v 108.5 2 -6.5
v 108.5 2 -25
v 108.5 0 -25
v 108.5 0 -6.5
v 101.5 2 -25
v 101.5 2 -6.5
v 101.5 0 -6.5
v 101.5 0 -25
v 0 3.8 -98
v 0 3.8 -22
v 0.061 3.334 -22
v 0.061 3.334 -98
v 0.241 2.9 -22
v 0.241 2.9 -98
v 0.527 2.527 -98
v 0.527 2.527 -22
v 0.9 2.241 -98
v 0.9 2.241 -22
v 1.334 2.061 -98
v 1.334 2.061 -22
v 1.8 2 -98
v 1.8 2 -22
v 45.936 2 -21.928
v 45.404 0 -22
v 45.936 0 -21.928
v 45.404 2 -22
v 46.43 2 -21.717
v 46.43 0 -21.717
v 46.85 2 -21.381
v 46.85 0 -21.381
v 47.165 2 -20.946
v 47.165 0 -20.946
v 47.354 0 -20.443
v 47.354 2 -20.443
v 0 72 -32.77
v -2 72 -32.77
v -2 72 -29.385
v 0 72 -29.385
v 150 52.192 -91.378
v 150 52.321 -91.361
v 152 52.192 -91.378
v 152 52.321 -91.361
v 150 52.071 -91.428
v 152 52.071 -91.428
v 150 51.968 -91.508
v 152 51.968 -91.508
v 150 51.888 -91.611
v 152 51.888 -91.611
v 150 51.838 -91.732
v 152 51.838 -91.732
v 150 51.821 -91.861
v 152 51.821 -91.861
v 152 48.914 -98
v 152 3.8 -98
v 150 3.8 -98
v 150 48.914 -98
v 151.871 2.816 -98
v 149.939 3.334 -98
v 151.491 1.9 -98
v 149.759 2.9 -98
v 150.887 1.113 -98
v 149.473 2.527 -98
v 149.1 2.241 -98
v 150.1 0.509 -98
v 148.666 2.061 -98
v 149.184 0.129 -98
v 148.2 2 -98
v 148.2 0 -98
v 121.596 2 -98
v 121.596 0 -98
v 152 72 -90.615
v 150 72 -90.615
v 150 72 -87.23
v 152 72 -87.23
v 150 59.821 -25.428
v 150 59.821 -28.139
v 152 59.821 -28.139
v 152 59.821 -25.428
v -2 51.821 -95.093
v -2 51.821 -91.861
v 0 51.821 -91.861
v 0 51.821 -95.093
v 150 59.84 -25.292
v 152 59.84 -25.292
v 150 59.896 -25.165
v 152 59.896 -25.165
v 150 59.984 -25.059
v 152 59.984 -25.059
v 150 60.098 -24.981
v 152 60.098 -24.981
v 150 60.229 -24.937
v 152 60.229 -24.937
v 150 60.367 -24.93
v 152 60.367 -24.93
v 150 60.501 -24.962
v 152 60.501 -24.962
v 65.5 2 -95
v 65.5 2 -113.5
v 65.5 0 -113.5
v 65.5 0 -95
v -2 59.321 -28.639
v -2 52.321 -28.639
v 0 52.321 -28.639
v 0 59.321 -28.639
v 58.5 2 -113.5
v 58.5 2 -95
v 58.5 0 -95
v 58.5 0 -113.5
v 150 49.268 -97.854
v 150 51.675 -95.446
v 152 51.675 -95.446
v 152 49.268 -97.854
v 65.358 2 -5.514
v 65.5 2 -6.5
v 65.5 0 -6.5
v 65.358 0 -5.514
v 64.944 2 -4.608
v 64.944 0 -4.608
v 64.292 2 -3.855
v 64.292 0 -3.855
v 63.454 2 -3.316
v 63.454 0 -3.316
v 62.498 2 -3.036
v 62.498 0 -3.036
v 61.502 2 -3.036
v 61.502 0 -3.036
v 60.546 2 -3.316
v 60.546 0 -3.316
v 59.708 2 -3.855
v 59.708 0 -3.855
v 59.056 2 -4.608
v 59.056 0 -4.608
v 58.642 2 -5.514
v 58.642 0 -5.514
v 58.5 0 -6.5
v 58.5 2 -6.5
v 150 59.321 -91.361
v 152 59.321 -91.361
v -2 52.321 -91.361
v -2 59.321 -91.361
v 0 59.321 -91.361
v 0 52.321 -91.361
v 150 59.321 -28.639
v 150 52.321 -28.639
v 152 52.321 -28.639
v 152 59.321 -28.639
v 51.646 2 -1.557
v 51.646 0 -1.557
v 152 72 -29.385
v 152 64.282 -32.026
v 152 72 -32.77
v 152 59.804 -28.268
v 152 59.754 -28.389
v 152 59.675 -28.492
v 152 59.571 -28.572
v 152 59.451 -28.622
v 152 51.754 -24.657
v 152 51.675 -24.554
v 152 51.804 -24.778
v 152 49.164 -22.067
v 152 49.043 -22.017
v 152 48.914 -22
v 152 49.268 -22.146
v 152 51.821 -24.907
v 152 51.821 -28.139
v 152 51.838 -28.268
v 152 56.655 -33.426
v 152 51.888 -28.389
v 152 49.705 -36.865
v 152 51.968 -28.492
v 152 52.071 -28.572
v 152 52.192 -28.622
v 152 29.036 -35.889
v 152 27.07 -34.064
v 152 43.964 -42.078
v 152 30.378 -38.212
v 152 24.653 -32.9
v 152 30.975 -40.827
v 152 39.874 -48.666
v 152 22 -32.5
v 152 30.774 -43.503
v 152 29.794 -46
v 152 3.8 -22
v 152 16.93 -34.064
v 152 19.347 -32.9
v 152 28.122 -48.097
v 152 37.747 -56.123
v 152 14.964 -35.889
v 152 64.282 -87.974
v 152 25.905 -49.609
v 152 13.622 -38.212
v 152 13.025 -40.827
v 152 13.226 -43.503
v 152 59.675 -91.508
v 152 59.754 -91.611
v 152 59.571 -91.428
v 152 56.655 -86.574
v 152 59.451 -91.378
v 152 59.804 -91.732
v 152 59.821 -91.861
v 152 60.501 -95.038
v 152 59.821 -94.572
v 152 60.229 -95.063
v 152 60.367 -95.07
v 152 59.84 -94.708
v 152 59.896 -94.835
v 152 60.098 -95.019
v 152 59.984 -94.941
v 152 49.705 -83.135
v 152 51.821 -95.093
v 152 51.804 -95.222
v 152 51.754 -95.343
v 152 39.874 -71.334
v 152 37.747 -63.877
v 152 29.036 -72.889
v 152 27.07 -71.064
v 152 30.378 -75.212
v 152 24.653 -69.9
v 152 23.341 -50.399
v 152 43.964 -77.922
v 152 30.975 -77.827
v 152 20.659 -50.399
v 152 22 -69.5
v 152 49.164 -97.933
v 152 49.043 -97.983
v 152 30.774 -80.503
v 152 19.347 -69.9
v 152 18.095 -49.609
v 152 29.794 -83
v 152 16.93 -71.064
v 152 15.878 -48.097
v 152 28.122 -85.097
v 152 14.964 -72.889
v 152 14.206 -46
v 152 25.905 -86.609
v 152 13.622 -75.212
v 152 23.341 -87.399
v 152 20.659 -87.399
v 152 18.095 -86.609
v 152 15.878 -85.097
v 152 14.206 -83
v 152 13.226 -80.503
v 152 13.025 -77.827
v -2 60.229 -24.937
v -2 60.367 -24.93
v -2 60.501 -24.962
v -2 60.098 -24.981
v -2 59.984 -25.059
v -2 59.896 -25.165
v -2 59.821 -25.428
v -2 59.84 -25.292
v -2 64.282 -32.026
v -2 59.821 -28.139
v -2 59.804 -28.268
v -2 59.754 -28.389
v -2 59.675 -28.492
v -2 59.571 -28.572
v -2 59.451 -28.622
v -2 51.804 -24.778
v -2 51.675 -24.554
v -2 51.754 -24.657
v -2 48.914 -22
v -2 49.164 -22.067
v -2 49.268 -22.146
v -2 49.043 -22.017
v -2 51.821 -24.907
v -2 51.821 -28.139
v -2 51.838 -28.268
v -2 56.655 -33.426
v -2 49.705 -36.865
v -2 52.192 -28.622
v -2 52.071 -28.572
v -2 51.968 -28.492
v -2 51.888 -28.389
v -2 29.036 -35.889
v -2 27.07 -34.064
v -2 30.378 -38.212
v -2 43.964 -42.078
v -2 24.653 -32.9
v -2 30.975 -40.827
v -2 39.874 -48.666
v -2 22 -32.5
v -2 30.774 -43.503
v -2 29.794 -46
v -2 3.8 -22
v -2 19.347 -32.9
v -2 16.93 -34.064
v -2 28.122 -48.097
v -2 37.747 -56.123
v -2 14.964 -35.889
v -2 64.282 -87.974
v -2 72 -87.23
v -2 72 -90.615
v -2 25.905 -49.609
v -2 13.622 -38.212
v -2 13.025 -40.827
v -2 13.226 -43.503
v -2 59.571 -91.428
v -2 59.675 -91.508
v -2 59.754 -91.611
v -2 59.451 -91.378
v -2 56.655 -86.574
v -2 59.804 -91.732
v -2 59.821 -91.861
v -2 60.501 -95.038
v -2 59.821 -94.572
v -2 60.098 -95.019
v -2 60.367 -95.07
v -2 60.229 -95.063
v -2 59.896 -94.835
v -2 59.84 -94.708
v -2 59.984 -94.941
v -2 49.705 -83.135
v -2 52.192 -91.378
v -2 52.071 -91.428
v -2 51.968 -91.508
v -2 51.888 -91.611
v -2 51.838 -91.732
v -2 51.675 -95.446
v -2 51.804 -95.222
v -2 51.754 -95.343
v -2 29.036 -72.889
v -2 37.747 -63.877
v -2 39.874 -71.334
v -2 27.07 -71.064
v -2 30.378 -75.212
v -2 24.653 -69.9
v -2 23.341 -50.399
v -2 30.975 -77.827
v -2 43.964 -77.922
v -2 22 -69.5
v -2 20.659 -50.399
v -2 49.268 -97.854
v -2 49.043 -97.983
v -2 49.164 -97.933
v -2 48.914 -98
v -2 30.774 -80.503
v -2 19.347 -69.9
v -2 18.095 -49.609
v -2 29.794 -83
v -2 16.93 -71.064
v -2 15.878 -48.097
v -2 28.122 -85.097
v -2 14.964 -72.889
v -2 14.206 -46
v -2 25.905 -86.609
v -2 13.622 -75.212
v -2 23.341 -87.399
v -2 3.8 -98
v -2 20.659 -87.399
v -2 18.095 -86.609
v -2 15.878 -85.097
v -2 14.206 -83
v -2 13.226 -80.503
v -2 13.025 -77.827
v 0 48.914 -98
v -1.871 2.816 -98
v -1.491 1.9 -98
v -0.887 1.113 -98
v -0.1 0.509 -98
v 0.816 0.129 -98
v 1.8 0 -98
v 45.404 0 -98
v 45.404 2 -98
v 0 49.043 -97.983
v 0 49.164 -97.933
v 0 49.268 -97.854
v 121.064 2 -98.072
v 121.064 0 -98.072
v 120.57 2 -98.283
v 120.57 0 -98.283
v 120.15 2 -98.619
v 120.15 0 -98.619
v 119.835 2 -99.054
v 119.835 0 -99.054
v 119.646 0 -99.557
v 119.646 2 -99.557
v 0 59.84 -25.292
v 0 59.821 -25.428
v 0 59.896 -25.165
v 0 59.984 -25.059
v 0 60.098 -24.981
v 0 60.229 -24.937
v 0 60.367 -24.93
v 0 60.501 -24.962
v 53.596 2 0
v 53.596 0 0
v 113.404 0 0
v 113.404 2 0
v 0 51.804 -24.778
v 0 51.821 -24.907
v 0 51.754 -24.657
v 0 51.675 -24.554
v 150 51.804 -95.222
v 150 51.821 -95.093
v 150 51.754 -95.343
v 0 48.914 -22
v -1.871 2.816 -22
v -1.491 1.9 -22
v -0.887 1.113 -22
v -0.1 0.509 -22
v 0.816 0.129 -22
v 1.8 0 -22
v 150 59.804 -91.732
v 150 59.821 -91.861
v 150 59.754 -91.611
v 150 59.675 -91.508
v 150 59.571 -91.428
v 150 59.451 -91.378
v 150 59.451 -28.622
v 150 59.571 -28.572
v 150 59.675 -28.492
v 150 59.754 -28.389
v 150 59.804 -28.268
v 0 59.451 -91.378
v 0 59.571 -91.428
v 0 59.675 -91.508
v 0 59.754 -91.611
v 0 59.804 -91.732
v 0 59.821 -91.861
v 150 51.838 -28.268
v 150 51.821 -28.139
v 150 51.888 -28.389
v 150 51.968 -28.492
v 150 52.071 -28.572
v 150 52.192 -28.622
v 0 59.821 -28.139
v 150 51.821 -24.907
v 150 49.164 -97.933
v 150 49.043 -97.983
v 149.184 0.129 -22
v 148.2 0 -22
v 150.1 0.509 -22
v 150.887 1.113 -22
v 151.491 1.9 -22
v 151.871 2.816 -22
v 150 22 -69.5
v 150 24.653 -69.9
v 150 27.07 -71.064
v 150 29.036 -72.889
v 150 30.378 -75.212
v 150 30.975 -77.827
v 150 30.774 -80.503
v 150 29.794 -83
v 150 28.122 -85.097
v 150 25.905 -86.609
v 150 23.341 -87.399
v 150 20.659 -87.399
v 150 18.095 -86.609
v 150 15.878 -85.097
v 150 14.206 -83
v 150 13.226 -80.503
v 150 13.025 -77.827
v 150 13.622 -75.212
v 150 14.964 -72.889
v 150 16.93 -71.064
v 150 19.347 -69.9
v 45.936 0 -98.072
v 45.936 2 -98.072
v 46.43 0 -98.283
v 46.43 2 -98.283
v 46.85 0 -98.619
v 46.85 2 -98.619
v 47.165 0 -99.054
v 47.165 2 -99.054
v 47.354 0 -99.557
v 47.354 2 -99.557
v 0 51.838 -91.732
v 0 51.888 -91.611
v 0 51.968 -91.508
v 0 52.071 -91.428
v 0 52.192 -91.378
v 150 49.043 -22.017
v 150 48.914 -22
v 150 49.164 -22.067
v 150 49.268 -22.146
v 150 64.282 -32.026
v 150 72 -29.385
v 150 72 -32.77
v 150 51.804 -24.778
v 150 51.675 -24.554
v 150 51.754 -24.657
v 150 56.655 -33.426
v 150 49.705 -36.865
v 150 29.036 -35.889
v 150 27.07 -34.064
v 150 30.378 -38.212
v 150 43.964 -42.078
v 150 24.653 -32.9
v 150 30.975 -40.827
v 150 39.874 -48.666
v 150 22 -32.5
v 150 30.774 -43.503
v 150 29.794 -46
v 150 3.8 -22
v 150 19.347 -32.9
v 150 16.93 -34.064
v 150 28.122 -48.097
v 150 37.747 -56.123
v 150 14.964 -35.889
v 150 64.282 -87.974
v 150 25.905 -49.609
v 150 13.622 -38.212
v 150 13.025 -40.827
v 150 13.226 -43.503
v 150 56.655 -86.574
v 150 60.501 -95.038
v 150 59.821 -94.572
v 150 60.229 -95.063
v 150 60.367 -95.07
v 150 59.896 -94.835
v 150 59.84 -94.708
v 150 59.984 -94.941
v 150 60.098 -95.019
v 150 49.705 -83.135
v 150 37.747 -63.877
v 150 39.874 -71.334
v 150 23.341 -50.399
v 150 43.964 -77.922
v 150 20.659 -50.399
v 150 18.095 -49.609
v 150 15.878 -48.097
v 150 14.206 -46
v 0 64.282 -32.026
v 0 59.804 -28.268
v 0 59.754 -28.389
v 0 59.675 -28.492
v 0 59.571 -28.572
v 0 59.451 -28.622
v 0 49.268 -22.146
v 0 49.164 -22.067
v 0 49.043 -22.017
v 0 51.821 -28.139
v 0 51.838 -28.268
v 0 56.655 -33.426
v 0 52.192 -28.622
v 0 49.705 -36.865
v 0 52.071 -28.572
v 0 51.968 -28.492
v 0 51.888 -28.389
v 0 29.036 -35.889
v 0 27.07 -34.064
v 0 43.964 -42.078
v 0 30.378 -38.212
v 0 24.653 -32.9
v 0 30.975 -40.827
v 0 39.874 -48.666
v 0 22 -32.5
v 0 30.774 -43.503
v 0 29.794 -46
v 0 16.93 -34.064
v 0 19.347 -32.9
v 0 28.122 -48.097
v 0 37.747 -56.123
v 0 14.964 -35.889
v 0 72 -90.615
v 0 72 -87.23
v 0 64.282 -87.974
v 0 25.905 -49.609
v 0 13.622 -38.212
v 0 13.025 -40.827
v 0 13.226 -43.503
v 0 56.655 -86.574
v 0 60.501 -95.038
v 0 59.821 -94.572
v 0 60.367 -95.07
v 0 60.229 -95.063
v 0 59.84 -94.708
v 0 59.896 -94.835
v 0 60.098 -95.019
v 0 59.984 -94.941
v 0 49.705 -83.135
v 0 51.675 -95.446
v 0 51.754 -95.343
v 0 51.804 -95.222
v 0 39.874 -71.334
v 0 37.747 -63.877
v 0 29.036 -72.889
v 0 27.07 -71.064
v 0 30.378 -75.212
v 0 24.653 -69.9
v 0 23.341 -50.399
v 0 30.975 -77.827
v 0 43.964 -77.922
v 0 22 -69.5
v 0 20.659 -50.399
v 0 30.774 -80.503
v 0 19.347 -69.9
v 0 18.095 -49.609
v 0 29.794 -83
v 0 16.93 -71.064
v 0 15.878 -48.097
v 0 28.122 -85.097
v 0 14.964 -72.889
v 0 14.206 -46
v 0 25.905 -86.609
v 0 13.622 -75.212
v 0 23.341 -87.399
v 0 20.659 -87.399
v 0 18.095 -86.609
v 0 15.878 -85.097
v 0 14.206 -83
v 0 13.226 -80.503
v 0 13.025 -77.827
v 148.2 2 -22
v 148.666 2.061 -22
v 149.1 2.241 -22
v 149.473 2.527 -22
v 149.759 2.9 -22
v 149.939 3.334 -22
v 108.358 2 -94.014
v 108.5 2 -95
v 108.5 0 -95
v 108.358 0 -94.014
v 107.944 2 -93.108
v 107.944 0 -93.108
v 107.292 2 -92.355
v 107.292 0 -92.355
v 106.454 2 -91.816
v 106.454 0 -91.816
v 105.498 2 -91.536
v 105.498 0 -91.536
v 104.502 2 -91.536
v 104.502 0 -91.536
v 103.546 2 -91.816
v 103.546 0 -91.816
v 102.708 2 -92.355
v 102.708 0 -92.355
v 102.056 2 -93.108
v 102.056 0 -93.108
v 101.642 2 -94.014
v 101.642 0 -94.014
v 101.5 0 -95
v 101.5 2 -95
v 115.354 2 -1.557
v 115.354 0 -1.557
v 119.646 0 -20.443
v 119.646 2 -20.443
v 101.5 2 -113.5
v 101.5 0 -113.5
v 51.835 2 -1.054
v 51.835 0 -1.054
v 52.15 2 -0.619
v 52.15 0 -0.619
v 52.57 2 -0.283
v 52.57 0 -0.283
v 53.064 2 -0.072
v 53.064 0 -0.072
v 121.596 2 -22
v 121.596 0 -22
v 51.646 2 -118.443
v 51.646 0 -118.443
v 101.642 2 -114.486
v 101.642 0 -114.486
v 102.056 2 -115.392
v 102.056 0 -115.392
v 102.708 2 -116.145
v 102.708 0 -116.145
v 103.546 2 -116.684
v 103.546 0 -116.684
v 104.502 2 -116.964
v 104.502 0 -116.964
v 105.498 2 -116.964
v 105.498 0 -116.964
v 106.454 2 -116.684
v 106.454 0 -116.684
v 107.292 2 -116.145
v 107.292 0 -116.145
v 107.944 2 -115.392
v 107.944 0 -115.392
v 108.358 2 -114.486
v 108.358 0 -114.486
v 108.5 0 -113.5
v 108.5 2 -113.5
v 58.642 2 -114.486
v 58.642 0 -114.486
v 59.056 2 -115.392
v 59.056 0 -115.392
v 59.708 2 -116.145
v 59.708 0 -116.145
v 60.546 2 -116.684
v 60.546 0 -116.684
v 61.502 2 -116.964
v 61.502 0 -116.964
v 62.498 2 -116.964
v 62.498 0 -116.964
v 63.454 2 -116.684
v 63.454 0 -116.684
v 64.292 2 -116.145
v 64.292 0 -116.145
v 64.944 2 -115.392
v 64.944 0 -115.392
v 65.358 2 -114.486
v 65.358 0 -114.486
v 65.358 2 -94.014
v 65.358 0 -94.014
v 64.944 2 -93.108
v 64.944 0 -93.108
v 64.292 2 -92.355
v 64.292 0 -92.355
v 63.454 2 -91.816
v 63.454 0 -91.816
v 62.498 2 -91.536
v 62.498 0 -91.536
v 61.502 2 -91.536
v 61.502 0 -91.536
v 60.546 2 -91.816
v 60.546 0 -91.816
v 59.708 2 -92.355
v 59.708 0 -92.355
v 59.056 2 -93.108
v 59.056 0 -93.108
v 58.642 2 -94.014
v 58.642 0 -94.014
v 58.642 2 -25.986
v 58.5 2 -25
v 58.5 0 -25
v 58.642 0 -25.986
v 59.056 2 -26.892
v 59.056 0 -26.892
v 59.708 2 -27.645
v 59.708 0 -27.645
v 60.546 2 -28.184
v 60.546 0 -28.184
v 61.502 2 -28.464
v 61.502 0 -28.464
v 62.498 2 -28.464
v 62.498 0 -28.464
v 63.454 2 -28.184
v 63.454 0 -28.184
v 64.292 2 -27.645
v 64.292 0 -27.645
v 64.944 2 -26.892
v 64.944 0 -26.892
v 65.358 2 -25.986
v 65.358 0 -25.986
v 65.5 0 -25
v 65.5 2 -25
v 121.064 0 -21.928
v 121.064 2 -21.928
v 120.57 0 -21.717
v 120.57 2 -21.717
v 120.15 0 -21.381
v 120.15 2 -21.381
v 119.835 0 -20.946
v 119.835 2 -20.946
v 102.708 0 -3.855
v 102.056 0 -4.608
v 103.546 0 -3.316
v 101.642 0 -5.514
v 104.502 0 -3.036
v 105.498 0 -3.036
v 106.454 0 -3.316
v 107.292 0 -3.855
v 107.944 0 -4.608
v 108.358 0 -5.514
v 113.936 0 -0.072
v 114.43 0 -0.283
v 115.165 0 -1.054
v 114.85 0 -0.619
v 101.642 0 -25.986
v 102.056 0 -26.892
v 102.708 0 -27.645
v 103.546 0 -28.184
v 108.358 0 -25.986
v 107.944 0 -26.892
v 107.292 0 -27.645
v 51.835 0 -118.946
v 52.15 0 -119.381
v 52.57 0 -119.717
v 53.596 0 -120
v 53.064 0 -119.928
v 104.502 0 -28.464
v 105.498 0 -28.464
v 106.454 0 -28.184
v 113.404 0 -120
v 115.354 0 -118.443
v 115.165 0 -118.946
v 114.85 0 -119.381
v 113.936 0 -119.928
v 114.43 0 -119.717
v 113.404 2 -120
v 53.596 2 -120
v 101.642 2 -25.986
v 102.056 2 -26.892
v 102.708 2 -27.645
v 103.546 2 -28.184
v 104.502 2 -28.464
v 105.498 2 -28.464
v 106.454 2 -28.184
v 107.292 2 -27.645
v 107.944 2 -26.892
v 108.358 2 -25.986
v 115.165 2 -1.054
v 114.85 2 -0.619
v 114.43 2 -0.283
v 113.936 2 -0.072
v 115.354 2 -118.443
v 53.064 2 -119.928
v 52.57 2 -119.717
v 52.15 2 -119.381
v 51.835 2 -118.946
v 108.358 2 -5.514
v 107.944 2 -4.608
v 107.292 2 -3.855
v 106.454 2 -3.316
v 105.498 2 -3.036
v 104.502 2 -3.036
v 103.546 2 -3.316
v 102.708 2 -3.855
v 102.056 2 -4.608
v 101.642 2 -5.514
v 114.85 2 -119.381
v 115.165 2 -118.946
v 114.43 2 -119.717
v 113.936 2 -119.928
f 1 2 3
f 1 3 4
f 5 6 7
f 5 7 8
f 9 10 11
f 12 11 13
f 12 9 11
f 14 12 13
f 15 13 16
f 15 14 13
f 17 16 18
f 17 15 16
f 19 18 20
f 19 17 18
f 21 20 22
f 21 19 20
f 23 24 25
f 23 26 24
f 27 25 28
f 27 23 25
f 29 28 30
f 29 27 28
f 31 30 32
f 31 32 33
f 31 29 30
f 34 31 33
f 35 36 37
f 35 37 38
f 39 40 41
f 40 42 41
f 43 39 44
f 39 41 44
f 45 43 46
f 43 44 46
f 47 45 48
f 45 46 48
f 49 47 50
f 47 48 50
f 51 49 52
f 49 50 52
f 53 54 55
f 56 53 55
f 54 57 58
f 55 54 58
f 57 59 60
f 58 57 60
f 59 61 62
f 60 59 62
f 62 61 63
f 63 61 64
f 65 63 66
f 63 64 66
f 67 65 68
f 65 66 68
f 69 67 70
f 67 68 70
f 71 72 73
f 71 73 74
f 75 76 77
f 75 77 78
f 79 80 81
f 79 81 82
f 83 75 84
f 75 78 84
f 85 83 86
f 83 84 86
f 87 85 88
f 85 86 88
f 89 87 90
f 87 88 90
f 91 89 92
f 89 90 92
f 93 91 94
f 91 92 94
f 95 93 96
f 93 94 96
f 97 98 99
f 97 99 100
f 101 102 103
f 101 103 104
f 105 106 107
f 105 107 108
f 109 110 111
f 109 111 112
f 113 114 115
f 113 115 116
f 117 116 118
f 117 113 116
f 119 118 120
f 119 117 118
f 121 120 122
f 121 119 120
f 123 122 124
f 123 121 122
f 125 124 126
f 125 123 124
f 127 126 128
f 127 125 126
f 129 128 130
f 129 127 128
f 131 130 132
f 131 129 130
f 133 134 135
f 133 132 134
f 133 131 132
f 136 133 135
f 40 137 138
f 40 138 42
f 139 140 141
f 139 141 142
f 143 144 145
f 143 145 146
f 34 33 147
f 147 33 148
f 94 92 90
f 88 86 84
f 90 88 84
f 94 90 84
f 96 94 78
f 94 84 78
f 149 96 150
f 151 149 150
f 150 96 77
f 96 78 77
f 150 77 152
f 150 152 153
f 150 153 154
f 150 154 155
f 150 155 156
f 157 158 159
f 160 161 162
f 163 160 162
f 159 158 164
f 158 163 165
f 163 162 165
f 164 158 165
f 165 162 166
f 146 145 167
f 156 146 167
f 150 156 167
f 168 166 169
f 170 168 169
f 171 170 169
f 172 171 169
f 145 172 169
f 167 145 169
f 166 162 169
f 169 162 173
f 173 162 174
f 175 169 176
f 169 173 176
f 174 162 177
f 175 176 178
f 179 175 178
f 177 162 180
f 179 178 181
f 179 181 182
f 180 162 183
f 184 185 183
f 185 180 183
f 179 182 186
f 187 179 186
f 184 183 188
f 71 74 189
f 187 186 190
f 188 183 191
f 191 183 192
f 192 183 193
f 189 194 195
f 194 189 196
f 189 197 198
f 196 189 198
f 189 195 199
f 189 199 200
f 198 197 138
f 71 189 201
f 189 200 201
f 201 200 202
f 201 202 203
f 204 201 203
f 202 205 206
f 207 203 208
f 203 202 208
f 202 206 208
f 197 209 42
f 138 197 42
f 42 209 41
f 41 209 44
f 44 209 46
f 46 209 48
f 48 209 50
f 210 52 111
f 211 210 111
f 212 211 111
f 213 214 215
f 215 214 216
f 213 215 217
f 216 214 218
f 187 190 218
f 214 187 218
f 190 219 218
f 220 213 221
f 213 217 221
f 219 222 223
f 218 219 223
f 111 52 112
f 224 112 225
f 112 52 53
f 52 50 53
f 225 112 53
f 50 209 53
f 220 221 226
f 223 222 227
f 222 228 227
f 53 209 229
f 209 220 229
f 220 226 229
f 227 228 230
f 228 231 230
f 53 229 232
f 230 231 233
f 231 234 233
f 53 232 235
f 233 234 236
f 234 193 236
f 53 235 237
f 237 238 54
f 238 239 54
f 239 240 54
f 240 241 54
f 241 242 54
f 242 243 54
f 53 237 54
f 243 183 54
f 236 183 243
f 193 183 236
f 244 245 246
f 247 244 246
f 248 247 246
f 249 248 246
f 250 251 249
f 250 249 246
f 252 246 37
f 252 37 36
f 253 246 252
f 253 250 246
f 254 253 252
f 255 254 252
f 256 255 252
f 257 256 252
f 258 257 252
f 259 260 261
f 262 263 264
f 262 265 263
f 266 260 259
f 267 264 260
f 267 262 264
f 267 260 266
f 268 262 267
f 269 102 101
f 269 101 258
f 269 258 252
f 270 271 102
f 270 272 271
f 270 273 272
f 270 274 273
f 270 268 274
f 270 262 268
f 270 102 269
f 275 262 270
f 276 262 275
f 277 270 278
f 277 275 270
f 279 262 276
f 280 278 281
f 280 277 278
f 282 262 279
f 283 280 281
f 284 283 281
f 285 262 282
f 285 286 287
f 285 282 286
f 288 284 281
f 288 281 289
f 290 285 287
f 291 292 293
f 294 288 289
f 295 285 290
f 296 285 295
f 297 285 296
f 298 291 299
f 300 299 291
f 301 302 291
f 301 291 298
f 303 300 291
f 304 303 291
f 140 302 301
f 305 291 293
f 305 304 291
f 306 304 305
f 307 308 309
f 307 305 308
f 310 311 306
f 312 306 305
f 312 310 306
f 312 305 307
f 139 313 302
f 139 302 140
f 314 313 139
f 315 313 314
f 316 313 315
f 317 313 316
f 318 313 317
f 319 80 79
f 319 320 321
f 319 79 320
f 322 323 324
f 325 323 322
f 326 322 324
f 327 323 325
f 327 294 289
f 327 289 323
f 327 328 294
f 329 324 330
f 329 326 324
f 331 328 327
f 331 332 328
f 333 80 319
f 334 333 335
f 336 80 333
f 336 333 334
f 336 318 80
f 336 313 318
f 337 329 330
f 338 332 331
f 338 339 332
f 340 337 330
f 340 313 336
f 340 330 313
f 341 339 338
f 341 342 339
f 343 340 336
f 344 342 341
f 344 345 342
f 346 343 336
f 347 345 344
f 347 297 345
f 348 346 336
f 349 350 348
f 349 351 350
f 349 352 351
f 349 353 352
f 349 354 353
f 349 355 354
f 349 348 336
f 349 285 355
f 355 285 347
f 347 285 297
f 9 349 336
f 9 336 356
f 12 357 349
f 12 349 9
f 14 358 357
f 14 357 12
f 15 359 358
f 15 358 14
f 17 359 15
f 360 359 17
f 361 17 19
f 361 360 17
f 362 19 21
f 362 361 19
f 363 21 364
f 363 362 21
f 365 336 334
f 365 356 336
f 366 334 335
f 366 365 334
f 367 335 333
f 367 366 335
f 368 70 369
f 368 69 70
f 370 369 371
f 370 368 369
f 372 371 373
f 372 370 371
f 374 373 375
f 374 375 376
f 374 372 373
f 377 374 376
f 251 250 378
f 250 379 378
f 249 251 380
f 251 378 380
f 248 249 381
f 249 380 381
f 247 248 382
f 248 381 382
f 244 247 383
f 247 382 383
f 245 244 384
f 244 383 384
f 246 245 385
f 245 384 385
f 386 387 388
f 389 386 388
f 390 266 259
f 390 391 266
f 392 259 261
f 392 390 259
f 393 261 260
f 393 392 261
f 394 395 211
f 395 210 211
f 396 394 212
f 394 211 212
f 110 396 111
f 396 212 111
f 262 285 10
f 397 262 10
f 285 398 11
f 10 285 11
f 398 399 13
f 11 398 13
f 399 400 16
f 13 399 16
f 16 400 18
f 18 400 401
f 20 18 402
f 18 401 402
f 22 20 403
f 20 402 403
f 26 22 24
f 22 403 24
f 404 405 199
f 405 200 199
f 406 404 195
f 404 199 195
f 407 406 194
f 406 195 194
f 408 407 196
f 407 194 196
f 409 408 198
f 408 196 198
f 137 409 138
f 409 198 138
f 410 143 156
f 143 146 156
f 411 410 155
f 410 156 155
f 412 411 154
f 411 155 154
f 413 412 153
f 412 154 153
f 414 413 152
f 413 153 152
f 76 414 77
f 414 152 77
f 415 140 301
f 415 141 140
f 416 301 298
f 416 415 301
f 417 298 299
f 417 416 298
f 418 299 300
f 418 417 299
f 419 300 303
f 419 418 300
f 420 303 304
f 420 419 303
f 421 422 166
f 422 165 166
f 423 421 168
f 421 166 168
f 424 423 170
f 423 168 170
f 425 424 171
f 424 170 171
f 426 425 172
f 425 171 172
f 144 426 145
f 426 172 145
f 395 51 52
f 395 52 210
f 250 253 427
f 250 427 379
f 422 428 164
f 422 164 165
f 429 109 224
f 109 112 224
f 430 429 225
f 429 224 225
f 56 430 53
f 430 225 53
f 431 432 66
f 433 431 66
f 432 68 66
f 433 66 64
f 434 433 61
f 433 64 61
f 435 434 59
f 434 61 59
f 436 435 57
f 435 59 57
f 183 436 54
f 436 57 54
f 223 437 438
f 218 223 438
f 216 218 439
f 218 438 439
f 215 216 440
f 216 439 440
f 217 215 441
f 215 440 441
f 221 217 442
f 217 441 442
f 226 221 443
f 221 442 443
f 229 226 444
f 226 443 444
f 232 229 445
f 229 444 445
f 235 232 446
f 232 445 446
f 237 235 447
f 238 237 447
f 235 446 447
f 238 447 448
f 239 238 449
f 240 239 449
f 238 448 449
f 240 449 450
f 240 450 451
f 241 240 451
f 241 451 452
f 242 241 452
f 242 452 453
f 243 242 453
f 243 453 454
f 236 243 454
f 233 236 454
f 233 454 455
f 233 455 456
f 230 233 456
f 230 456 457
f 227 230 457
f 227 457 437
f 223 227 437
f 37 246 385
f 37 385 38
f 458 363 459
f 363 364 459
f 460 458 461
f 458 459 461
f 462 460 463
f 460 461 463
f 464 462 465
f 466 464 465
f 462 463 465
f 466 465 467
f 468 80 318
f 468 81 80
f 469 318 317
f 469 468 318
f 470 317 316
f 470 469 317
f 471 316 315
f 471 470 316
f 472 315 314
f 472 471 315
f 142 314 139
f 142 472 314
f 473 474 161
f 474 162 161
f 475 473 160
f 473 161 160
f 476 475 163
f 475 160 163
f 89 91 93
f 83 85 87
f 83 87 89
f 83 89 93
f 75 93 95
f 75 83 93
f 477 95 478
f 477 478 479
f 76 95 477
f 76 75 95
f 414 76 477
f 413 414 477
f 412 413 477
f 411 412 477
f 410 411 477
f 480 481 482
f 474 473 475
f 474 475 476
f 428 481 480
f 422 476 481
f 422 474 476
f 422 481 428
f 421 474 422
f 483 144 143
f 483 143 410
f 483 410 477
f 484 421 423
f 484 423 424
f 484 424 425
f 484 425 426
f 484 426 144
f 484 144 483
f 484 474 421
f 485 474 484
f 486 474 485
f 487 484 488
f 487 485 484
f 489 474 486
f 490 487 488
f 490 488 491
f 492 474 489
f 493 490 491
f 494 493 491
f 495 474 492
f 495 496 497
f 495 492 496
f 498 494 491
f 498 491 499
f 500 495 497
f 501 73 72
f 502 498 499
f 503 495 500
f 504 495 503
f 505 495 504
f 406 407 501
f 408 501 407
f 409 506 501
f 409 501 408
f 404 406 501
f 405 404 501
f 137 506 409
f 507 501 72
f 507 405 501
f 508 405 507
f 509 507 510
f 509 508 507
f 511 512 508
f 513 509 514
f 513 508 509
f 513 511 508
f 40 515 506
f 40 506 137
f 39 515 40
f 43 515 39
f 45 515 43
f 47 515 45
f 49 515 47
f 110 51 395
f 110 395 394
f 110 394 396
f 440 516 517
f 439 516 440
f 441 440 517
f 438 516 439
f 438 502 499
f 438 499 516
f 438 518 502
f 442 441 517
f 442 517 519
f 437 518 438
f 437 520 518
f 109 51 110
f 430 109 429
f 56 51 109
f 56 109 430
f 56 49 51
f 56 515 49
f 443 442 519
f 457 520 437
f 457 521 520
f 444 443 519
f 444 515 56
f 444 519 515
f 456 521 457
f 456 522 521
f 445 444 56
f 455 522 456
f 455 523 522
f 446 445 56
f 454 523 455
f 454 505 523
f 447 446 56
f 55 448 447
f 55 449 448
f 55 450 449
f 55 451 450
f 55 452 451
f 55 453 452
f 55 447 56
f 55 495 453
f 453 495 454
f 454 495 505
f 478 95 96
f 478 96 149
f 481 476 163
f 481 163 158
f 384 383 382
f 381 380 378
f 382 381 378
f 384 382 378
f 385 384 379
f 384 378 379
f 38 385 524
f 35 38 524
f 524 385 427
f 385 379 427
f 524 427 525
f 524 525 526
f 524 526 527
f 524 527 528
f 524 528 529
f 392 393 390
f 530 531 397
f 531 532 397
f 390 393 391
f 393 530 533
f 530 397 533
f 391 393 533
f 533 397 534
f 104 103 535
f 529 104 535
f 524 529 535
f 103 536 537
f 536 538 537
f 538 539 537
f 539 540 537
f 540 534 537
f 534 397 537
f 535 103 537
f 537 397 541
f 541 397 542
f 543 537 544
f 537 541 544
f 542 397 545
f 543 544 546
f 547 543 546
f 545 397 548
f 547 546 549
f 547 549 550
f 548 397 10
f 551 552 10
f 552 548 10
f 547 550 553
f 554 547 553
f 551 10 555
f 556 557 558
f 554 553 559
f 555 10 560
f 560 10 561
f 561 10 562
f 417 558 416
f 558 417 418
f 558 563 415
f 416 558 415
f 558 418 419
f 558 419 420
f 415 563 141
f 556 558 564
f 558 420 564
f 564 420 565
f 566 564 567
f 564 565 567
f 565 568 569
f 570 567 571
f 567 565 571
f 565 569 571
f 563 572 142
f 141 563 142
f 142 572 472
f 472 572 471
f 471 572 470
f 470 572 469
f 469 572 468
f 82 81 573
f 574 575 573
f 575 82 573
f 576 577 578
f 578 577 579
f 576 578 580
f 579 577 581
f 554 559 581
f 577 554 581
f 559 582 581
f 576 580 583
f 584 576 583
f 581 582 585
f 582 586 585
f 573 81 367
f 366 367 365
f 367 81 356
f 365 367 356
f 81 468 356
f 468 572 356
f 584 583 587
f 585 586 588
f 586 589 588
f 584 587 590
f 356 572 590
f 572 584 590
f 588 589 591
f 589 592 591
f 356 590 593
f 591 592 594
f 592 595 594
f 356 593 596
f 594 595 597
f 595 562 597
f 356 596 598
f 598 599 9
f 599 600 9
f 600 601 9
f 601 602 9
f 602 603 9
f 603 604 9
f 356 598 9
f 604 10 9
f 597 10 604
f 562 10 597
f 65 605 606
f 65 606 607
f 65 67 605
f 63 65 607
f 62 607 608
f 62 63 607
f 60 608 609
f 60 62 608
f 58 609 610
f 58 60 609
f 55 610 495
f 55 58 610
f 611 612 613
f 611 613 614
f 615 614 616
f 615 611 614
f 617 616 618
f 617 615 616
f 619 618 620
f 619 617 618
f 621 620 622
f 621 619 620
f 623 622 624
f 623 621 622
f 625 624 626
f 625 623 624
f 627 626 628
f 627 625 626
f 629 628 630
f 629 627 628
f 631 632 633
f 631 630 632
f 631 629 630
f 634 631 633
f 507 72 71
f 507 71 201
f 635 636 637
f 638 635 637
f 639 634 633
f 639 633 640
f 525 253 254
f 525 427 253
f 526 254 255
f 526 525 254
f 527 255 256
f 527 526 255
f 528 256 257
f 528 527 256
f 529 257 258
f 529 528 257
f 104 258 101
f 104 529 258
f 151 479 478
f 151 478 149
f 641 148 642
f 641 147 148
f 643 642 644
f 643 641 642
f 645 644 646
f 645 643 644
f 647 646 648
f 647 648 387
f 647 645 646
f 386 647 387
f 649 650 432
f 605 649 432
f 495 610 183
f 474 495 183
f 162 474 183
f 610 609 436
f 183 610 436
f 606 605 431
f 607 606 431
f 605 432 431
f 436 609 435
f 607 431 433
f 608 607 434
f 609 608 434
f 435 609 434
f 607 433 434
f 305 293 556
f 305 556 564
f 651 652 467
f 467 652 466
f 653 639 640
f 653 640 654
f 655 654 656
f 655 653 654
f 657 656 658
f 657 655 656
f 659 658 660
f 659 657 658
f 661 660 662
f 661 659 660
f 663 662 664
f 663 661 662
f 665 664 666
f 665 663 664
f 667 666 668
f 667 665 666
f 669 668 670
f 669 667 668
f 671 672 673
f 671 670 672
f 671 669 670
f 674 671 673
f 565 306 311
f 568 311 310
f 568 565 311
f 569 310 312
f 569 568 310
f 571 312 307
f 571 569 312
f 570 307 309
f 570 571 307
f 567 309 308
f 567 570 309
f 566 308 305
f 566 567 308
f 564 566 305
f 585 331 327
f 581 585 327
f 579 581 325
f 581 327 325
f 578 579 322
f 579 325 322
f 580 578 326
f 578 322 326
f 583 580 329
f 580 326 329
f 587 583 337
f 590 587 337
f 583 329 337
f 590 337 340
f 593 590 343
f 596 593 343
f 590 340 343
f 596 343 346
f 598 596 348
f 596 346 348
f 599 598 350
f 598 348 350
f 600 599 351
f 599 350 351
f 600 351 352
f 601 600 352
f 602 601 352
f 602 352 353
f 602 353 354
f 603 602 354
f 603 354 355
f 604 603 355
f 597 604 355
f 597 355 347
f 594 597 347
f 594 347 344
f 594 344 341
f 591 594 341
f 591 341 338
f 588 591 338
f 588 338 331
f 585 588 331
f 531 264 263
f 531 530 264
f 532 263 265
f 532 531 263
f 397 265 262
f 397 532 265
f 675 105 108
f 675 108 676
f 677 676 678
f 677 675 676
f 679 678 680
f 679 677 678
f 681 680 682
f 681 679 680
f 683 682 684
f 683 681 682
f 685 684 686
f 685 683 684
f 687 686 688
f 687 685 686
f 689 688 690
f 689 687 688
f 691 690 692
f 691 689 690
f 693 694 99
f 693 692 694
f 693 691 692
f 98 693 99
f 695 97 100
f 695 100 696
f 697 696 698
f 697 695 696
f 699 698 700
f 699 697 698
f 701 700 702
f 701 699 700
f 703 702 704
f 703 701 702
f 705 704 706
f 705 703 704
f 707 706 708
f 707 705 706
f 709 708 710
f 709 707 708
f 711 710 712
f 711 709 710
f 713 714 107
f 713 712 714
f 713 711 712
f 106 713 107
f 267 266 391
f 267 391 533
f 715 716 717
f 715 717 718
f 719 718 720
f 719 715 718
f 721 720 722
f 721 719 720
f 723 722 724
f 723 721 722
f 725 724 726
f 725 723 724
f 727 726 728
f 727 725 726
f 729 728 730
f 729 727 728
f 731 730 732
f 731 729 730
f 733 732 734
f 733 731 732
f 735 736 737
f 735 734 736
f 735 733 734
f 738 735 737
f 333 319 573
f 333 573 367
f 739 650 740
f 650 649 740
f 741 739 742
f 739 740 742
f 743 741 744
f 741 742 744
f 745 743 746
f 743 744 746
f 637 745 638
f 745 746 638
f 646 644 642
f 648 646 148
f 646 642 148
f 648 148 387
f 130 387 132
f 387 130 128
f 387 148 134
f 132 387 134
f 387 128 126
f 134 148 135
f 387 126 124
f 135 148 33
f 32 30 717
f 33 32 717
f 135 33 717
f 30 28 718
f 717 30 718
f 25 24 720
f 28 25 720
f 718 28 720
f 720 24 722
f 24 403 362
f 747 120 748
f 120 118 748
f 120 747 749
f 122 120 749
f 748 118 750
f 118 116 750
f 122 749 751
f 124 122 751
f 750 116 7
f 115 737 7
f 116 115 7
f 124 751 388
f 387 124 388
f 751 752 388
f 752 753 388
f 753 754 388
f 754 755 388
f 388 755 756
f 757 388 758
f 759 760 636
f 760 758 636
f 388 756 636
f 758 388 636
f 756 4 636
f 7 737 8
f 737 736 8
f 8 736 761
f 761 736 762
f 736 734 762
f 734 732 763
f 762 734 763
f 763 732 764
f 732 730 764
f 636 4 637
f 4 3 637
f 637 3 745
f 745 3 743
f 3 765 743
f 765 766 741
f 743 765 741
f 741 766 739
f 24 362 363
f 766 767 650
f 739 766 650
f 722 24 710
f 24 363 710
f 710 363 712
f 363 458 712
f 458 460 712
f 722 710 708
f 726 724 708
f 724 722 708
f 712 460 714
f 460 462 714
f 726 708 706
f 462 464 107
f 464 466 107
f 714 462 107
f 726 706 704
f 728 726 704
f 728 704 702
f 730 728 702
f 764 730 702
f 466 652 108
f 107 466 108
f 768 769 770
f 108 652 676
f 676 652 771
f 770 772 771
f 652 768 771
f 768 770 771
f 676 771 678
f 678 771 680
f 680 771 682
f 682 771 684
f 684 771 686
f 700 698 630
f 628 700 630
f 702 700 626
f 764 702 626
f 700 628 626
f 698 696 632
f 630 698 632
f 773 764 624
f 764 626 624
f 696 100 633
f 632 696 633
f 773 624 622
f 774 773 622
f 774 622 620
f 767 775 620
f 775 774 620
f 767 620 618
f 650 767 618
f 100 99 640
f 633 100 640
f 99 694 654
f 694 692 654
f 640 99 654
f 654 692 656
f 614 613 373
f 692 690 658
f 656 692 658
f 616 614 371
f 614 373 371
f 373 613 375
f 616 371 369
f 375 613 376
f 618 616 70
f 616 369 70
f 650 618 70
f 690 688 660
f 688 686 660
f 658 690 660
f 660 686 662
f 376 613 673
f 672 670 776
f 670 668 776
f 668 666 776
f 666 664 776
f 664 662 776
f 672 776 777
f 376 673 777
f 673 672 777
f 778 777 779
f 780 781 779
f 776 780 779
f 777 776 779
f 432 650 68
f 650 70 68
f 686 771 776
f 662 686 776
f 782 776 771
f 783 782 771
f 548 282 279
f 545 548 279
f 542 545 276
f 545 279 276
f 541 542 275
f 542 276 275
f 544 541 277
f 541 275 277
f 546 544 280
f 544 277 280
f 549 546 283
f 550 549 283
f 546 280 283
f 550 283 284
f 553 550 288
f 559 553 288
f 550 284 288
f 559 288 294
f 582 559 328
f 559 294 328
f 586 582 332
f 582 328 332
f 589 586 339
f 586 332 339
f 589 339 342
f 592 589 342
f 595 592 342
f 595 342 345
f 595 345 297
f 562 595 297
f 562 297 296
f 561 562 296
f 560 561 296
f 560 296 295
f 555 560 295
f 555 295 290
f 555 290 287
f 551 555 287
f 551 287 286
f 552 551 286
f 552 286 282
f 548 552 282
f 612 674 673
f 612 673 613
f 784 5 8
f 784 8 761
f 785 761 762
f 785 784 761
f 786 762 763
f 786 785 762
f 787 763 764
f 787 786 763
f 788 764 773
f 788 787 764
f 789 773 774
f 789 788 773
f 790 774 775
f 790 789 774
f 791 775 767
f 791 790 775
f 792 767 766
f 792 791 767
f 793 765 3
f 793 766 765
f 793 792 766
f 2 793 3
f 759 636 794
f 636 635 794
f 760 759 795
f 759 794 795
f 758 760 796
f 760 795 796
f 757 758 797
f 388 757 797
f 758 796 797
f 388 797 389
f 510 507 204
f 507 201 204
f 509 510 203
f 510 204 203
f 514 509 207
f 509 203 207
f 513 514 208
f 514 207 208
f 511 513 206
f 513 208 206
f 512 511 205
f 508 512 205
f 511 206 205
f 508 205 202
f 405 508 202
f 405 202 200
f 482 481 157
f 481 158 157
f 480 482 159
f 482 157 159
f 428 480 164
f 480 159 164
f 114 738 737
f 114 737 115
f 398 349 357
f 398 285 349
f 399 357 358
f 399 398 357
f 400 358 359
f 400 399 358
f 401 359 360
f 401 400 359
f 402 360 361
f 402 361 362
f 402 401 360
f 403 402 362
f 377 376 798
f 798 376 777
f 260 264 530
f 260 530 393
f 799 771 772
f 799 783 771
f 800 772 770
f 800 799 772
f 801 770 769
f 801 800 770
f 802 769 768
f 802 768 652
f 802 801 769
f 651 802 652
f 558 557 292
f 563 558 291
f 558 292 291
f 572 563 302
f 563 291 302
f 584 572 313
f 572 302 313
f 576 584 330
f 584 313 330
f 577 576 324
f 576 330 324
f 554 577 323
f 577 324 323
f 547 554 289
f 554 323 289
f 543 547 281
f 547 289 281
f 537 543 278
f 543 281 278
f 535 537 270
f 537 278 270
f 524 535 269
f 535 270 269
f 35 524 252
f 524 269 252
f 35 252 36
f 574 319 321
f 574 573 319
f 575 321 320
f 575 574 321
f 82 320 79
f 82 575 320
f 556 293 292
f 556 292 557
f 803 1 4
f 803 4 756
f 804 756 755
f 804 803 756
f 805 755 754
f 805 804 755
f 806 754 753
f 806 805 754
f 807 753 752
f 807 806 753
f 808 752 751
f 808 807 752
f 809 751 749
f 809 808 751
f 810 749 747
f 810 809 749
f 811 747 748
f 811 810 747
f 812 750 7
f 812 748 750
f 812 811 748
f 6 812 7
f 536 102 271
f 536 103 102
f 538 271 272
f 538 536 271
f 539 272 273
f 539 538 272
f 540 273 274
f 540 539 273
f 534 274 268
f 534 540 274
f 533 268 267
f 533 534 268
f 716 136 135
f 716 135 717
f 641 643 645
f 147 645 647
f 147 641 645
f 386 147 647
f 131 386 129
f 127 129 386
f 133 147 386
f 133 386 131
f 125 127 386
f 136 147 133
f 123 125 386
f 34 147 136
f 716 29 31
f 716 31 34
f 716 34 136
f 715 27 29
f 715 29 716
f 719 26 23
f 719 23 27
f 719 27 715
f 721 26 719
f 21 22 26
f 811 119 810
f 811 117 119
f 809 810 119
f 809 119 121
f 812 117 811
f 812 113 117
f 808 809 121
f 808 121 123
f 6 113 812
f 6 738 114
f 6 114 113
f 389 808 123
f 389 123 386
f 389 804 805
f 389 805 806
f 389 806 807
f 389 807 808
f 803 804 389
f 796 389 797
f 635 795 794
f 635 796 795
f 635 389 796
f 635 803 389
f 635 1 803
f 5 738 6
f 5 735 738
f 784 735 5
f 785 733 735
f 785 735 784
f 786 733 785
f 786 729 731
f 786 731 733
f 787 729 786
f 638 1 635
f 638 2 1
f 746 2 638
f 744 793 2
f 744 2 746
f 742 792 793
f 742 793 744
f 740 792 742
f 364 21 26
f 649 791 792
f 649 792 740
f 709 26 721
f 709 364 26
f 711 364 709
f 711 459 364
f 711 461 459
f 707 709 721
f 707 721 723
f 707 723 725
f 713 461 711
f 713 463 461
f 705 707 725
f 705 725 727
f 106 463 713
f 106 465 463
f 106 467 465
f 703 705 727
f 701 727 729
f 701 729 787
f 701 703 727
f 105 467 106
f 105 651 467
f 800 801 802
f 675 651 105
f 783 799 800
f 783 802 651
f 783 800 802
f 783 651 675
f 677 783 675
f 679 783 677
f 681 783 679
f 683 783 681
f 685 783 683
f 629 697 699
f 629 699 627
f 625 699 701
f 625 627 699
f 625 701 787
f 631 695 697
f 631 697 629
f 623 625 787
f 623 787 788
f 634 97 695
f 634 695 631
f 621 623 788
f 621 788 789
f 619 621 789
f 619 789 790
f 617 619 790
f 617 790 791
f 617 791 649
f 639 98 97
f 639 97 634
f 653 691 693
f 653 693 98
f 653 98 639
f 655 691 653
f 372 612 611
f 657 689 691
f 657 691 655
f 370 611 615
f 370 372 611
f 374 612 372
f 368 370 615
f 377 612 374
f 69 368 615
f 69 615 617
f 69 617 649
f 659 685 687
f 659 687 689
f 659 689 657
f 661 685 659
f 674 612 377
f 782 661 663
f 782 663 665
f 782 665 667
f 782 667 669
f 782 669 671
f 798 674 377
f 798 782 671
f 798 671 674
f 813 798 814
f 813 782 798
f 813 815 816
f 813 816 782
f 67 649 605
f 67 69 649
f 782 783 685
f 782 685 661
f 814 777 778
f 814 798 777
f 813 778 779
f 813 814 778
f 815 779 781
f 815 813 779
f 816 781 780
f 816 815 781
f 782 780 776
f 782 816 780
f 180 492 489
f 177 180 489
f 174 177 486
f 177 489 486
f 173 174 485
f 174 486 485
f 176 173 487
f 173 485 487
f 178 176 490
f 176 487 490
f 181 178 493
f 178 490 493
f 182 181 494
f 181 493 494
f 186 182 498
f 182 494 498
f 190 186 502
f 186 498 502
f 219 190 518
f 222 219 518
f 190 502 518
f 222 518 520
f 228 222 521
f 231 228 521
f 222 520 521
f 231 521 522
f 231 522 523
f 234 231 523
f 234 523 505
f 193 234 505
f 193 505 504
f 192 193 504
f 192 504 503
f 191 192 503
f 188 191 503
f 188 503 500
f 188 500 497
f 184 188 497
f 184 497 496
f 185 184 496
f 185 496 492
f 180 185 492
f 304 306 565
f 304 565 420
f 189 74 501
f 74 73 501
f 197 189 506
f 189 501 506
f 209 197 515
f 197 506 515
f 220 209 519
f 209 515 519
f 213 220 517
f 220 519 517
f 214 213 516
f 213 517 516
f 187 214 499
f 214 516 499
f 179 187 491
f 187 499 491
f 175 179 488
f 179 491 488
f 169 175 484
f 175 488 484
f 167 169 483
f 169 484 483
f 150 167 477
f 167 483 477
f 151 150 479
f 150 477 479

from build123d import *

# Parameters (mm, degrees)
EXTRUDE_1_DEPTH     = 2
SKETCH_3_W          = 2
SKETCH_3_H          = 76
EXTRUDE_2_DEPTH     = 70
SKETCH_5_R          = 28
CUT_EXTRUDE_1_DEPTH = 209.086520467
FILLET_1_R          = 0.5
FILLET_2_R          = 1.8
FILLET_3_R          = 3.8
FILLET_4_R          = 2
SKETCH_6_R          = 9
CUT_EXTRUDE_2_DEPTH = 209.086520467
CUT_EXTRUDE_3_DEPTH = 10


with BuildPart() as part:
    # Эскиз1 → Бобышка-Вытянуть1 (new body)
    with BuildSketch(Plane(origin=(0, 0, 0), x_dir=(1, 0, 0), z_dir=(0, 1, 0))):
        Polygon((52, 0), (115, 0), (120, 22), (152, 22), (152, 98), (120, 98), (115, 120), (52, 120), (47, 98), (-2, 98), (-2, 22), (47, 22), align=None)
    extrude(amount=EXTRUDE_1_DEPTH)

    # Эскиз3 → Бобышка-Вытянуть2 (add)
    with BuildSketch(Plane(origin=(0, 2, 0), x_dir=(1, 0, 0), z_dir=(0, 1, 0))):
        with Locations((-1, 60)):
            Rectangle(SKETCH_3_W, SKETCH_3_H)
        with Locations((151, 60)):
            Rectangle(SKETCH_3_W, SKETCH_3_H)
    extrude(amount=EXTRUDE_2_DEPTH)

    # Эскиз5 → Вырез-Вытянуть1 (cut, through all)
    with BuildSketch(Plane.ZY.offset(2)):
        with Locations((-60, 65.477437004)):
            Circle(SKETCH_5_R)
        Polygon((-95.299672715, 59.821425916), (-91.361232517, 59.821425916), (-91.361232517, 51.821425916), (-95.299672715, 51.821425916), (-98, 49.121098631), (-98, 72), (-90.614846418, 72), align=None)
        Polygon((-22, 72), (-22, 49.121098631), (-24.700327285, 51.821425916), (-28.638767483, 51.821425916), (-28.638767483, 59.821425916), (-24.700327285, 59.821425916), (-29.385153582, 72), align=None)
    extrude(amount=-CUT_EXTRUDE_1_DEPTH, mode=Mode.SUBTRACT)

    # Скругление1
    fillet_1_edges = [part.edges().sort_by_distance(p)[0] for p in [
        (-1, 49.121098631, -22),
        (151, 49.121098631, -22),
        (-1, 51.821425916, -24.700327285),
        (151, 51.821425916, -24.700327285),
        (-1, 51.821425916, -28.638767483),
        (151, 51.821425916, -28.638767483),
        (-1, 59.821425916, -28.638767483),
        (151, 59.821425916, -28.638767483),
        (-1, 59.821425916, -24.700327285),
        (151, 59.821425916, -24.700327285),
        (-1, 59.821425916, -95.299672715),
        (151, 59.821425916, -95.299672715),
        (-1, 59.821425916, -91.361232517),
        (151, 59.821425916, -91.361232517),
        (-1, 51.821425916, -91.361232517),
        (151, 51.821425916, -91.361232517),
        (-1, 51.821425916, -95.299672715),
        (151, 51.821425916, -95.299672715),
        (-1, 49.121098631, -98),
        (151, 49.121098631, -98),
    ]]
    fillet(fillet_1_edges, radius=FILLET_1_R)

    # Скругление2
    fillet_2_edges = [part.edges().sort_by_distance(p)[0] for p in [
        (0, 2, -60),
        (150, 2, -60),
    ]]
    fillet(fillet_2_edges, radius=FILLET_2_R)

    # Скругление3
    fillet_3_edges = [part.edges().sort_by_distance(p)[0] for p in [
        (152, 0, -60),
        (-2, 0, -60),
    ]]
    fillet(fillet_3_edges, radius=FILLET_3_R)

    # Скругление4
    fillet_4_edges = [part.edges().sort_by_distance(p)[0] for p in [
        (115, 1, -120),
        (120, 1, -98),
        (120, 1, -22),
        (115, 1, 0),
        (52, 1, 0),
        (47, 1, -22),
        (47, 1, -98),
        (52, 1, -120),
    ]]
    fillet(fillet_4_edges, radius=FILLET_4_R)

    # Эскиз6 → Вырез-Вытянуть2 (cut, through all)
    with BuildSketch(Plane.ZY.offset(2)):
        with Locations((-78.5, 22)):
            Circle(SKETCH_6_R)
        with Locations((-41.5, 22)):
            Circle(SKETCH_6_R)
    extrude(amount=-CUT_EXTRUDE_2_DEPTH, mode=Mode.SUBTRACT)

    # Эскиз7 → Вырез-Вытянуть3 (cut)
    with BuildSketch(Plane(origin=(0, 2, 0), x_dir=(1, 0, 0), z_dir=(0, 1, 0))):
        with BuildLine():
            Line((65.5, 25), (65.5, 6.5))
            ThreePointArc((65.5, 6.5), (62, 3), (58.5, 6.5))
            Line((58.5, 6.5), (58.5, 25))
            ThreePointArc((58.5, 25), (62, 28.5), (65.5, 25))
        make_face()
        with BuildLine():
            Line((108.5, 25), (108.5, 6.5))
            ThreePointArc((108.5, 6.5), (105, 3), (101.5, 6.5))
            Line((101.5, 6.5), (101.5, 25))
            ThreePointArc((101.5, 25), (105, 28.5), (108.5, 25))
        make_face()
        with BuildLine():
            Line((101.5, 95), (101.5, 113.5))
            ThreePointArc((101.5, 113.5), (105, 117), (108.5, 113.5))
            Line((108.5, 113.5), (108.5, 95))
            ThreePointArc((108.5, 95), (105, 91.5), (101.5, 95))
        make_face()
        with BuildLine():
            Line((58.5, 95), (58.5, 113.5))
            ThreePointArc((58.5, 113.5), (62, 117), (65.5, 113.5))
            Line((65.5, 113.5), (65.5, 95))
            ThreePointArc((65.5, 95), (62, 91.5), (58.5, 95))
        make_face()
    extrude(amount=-CUT_EXTRUDE_3_DEPTH, mode=Mode.SUBTRACT)


solid = part.part
